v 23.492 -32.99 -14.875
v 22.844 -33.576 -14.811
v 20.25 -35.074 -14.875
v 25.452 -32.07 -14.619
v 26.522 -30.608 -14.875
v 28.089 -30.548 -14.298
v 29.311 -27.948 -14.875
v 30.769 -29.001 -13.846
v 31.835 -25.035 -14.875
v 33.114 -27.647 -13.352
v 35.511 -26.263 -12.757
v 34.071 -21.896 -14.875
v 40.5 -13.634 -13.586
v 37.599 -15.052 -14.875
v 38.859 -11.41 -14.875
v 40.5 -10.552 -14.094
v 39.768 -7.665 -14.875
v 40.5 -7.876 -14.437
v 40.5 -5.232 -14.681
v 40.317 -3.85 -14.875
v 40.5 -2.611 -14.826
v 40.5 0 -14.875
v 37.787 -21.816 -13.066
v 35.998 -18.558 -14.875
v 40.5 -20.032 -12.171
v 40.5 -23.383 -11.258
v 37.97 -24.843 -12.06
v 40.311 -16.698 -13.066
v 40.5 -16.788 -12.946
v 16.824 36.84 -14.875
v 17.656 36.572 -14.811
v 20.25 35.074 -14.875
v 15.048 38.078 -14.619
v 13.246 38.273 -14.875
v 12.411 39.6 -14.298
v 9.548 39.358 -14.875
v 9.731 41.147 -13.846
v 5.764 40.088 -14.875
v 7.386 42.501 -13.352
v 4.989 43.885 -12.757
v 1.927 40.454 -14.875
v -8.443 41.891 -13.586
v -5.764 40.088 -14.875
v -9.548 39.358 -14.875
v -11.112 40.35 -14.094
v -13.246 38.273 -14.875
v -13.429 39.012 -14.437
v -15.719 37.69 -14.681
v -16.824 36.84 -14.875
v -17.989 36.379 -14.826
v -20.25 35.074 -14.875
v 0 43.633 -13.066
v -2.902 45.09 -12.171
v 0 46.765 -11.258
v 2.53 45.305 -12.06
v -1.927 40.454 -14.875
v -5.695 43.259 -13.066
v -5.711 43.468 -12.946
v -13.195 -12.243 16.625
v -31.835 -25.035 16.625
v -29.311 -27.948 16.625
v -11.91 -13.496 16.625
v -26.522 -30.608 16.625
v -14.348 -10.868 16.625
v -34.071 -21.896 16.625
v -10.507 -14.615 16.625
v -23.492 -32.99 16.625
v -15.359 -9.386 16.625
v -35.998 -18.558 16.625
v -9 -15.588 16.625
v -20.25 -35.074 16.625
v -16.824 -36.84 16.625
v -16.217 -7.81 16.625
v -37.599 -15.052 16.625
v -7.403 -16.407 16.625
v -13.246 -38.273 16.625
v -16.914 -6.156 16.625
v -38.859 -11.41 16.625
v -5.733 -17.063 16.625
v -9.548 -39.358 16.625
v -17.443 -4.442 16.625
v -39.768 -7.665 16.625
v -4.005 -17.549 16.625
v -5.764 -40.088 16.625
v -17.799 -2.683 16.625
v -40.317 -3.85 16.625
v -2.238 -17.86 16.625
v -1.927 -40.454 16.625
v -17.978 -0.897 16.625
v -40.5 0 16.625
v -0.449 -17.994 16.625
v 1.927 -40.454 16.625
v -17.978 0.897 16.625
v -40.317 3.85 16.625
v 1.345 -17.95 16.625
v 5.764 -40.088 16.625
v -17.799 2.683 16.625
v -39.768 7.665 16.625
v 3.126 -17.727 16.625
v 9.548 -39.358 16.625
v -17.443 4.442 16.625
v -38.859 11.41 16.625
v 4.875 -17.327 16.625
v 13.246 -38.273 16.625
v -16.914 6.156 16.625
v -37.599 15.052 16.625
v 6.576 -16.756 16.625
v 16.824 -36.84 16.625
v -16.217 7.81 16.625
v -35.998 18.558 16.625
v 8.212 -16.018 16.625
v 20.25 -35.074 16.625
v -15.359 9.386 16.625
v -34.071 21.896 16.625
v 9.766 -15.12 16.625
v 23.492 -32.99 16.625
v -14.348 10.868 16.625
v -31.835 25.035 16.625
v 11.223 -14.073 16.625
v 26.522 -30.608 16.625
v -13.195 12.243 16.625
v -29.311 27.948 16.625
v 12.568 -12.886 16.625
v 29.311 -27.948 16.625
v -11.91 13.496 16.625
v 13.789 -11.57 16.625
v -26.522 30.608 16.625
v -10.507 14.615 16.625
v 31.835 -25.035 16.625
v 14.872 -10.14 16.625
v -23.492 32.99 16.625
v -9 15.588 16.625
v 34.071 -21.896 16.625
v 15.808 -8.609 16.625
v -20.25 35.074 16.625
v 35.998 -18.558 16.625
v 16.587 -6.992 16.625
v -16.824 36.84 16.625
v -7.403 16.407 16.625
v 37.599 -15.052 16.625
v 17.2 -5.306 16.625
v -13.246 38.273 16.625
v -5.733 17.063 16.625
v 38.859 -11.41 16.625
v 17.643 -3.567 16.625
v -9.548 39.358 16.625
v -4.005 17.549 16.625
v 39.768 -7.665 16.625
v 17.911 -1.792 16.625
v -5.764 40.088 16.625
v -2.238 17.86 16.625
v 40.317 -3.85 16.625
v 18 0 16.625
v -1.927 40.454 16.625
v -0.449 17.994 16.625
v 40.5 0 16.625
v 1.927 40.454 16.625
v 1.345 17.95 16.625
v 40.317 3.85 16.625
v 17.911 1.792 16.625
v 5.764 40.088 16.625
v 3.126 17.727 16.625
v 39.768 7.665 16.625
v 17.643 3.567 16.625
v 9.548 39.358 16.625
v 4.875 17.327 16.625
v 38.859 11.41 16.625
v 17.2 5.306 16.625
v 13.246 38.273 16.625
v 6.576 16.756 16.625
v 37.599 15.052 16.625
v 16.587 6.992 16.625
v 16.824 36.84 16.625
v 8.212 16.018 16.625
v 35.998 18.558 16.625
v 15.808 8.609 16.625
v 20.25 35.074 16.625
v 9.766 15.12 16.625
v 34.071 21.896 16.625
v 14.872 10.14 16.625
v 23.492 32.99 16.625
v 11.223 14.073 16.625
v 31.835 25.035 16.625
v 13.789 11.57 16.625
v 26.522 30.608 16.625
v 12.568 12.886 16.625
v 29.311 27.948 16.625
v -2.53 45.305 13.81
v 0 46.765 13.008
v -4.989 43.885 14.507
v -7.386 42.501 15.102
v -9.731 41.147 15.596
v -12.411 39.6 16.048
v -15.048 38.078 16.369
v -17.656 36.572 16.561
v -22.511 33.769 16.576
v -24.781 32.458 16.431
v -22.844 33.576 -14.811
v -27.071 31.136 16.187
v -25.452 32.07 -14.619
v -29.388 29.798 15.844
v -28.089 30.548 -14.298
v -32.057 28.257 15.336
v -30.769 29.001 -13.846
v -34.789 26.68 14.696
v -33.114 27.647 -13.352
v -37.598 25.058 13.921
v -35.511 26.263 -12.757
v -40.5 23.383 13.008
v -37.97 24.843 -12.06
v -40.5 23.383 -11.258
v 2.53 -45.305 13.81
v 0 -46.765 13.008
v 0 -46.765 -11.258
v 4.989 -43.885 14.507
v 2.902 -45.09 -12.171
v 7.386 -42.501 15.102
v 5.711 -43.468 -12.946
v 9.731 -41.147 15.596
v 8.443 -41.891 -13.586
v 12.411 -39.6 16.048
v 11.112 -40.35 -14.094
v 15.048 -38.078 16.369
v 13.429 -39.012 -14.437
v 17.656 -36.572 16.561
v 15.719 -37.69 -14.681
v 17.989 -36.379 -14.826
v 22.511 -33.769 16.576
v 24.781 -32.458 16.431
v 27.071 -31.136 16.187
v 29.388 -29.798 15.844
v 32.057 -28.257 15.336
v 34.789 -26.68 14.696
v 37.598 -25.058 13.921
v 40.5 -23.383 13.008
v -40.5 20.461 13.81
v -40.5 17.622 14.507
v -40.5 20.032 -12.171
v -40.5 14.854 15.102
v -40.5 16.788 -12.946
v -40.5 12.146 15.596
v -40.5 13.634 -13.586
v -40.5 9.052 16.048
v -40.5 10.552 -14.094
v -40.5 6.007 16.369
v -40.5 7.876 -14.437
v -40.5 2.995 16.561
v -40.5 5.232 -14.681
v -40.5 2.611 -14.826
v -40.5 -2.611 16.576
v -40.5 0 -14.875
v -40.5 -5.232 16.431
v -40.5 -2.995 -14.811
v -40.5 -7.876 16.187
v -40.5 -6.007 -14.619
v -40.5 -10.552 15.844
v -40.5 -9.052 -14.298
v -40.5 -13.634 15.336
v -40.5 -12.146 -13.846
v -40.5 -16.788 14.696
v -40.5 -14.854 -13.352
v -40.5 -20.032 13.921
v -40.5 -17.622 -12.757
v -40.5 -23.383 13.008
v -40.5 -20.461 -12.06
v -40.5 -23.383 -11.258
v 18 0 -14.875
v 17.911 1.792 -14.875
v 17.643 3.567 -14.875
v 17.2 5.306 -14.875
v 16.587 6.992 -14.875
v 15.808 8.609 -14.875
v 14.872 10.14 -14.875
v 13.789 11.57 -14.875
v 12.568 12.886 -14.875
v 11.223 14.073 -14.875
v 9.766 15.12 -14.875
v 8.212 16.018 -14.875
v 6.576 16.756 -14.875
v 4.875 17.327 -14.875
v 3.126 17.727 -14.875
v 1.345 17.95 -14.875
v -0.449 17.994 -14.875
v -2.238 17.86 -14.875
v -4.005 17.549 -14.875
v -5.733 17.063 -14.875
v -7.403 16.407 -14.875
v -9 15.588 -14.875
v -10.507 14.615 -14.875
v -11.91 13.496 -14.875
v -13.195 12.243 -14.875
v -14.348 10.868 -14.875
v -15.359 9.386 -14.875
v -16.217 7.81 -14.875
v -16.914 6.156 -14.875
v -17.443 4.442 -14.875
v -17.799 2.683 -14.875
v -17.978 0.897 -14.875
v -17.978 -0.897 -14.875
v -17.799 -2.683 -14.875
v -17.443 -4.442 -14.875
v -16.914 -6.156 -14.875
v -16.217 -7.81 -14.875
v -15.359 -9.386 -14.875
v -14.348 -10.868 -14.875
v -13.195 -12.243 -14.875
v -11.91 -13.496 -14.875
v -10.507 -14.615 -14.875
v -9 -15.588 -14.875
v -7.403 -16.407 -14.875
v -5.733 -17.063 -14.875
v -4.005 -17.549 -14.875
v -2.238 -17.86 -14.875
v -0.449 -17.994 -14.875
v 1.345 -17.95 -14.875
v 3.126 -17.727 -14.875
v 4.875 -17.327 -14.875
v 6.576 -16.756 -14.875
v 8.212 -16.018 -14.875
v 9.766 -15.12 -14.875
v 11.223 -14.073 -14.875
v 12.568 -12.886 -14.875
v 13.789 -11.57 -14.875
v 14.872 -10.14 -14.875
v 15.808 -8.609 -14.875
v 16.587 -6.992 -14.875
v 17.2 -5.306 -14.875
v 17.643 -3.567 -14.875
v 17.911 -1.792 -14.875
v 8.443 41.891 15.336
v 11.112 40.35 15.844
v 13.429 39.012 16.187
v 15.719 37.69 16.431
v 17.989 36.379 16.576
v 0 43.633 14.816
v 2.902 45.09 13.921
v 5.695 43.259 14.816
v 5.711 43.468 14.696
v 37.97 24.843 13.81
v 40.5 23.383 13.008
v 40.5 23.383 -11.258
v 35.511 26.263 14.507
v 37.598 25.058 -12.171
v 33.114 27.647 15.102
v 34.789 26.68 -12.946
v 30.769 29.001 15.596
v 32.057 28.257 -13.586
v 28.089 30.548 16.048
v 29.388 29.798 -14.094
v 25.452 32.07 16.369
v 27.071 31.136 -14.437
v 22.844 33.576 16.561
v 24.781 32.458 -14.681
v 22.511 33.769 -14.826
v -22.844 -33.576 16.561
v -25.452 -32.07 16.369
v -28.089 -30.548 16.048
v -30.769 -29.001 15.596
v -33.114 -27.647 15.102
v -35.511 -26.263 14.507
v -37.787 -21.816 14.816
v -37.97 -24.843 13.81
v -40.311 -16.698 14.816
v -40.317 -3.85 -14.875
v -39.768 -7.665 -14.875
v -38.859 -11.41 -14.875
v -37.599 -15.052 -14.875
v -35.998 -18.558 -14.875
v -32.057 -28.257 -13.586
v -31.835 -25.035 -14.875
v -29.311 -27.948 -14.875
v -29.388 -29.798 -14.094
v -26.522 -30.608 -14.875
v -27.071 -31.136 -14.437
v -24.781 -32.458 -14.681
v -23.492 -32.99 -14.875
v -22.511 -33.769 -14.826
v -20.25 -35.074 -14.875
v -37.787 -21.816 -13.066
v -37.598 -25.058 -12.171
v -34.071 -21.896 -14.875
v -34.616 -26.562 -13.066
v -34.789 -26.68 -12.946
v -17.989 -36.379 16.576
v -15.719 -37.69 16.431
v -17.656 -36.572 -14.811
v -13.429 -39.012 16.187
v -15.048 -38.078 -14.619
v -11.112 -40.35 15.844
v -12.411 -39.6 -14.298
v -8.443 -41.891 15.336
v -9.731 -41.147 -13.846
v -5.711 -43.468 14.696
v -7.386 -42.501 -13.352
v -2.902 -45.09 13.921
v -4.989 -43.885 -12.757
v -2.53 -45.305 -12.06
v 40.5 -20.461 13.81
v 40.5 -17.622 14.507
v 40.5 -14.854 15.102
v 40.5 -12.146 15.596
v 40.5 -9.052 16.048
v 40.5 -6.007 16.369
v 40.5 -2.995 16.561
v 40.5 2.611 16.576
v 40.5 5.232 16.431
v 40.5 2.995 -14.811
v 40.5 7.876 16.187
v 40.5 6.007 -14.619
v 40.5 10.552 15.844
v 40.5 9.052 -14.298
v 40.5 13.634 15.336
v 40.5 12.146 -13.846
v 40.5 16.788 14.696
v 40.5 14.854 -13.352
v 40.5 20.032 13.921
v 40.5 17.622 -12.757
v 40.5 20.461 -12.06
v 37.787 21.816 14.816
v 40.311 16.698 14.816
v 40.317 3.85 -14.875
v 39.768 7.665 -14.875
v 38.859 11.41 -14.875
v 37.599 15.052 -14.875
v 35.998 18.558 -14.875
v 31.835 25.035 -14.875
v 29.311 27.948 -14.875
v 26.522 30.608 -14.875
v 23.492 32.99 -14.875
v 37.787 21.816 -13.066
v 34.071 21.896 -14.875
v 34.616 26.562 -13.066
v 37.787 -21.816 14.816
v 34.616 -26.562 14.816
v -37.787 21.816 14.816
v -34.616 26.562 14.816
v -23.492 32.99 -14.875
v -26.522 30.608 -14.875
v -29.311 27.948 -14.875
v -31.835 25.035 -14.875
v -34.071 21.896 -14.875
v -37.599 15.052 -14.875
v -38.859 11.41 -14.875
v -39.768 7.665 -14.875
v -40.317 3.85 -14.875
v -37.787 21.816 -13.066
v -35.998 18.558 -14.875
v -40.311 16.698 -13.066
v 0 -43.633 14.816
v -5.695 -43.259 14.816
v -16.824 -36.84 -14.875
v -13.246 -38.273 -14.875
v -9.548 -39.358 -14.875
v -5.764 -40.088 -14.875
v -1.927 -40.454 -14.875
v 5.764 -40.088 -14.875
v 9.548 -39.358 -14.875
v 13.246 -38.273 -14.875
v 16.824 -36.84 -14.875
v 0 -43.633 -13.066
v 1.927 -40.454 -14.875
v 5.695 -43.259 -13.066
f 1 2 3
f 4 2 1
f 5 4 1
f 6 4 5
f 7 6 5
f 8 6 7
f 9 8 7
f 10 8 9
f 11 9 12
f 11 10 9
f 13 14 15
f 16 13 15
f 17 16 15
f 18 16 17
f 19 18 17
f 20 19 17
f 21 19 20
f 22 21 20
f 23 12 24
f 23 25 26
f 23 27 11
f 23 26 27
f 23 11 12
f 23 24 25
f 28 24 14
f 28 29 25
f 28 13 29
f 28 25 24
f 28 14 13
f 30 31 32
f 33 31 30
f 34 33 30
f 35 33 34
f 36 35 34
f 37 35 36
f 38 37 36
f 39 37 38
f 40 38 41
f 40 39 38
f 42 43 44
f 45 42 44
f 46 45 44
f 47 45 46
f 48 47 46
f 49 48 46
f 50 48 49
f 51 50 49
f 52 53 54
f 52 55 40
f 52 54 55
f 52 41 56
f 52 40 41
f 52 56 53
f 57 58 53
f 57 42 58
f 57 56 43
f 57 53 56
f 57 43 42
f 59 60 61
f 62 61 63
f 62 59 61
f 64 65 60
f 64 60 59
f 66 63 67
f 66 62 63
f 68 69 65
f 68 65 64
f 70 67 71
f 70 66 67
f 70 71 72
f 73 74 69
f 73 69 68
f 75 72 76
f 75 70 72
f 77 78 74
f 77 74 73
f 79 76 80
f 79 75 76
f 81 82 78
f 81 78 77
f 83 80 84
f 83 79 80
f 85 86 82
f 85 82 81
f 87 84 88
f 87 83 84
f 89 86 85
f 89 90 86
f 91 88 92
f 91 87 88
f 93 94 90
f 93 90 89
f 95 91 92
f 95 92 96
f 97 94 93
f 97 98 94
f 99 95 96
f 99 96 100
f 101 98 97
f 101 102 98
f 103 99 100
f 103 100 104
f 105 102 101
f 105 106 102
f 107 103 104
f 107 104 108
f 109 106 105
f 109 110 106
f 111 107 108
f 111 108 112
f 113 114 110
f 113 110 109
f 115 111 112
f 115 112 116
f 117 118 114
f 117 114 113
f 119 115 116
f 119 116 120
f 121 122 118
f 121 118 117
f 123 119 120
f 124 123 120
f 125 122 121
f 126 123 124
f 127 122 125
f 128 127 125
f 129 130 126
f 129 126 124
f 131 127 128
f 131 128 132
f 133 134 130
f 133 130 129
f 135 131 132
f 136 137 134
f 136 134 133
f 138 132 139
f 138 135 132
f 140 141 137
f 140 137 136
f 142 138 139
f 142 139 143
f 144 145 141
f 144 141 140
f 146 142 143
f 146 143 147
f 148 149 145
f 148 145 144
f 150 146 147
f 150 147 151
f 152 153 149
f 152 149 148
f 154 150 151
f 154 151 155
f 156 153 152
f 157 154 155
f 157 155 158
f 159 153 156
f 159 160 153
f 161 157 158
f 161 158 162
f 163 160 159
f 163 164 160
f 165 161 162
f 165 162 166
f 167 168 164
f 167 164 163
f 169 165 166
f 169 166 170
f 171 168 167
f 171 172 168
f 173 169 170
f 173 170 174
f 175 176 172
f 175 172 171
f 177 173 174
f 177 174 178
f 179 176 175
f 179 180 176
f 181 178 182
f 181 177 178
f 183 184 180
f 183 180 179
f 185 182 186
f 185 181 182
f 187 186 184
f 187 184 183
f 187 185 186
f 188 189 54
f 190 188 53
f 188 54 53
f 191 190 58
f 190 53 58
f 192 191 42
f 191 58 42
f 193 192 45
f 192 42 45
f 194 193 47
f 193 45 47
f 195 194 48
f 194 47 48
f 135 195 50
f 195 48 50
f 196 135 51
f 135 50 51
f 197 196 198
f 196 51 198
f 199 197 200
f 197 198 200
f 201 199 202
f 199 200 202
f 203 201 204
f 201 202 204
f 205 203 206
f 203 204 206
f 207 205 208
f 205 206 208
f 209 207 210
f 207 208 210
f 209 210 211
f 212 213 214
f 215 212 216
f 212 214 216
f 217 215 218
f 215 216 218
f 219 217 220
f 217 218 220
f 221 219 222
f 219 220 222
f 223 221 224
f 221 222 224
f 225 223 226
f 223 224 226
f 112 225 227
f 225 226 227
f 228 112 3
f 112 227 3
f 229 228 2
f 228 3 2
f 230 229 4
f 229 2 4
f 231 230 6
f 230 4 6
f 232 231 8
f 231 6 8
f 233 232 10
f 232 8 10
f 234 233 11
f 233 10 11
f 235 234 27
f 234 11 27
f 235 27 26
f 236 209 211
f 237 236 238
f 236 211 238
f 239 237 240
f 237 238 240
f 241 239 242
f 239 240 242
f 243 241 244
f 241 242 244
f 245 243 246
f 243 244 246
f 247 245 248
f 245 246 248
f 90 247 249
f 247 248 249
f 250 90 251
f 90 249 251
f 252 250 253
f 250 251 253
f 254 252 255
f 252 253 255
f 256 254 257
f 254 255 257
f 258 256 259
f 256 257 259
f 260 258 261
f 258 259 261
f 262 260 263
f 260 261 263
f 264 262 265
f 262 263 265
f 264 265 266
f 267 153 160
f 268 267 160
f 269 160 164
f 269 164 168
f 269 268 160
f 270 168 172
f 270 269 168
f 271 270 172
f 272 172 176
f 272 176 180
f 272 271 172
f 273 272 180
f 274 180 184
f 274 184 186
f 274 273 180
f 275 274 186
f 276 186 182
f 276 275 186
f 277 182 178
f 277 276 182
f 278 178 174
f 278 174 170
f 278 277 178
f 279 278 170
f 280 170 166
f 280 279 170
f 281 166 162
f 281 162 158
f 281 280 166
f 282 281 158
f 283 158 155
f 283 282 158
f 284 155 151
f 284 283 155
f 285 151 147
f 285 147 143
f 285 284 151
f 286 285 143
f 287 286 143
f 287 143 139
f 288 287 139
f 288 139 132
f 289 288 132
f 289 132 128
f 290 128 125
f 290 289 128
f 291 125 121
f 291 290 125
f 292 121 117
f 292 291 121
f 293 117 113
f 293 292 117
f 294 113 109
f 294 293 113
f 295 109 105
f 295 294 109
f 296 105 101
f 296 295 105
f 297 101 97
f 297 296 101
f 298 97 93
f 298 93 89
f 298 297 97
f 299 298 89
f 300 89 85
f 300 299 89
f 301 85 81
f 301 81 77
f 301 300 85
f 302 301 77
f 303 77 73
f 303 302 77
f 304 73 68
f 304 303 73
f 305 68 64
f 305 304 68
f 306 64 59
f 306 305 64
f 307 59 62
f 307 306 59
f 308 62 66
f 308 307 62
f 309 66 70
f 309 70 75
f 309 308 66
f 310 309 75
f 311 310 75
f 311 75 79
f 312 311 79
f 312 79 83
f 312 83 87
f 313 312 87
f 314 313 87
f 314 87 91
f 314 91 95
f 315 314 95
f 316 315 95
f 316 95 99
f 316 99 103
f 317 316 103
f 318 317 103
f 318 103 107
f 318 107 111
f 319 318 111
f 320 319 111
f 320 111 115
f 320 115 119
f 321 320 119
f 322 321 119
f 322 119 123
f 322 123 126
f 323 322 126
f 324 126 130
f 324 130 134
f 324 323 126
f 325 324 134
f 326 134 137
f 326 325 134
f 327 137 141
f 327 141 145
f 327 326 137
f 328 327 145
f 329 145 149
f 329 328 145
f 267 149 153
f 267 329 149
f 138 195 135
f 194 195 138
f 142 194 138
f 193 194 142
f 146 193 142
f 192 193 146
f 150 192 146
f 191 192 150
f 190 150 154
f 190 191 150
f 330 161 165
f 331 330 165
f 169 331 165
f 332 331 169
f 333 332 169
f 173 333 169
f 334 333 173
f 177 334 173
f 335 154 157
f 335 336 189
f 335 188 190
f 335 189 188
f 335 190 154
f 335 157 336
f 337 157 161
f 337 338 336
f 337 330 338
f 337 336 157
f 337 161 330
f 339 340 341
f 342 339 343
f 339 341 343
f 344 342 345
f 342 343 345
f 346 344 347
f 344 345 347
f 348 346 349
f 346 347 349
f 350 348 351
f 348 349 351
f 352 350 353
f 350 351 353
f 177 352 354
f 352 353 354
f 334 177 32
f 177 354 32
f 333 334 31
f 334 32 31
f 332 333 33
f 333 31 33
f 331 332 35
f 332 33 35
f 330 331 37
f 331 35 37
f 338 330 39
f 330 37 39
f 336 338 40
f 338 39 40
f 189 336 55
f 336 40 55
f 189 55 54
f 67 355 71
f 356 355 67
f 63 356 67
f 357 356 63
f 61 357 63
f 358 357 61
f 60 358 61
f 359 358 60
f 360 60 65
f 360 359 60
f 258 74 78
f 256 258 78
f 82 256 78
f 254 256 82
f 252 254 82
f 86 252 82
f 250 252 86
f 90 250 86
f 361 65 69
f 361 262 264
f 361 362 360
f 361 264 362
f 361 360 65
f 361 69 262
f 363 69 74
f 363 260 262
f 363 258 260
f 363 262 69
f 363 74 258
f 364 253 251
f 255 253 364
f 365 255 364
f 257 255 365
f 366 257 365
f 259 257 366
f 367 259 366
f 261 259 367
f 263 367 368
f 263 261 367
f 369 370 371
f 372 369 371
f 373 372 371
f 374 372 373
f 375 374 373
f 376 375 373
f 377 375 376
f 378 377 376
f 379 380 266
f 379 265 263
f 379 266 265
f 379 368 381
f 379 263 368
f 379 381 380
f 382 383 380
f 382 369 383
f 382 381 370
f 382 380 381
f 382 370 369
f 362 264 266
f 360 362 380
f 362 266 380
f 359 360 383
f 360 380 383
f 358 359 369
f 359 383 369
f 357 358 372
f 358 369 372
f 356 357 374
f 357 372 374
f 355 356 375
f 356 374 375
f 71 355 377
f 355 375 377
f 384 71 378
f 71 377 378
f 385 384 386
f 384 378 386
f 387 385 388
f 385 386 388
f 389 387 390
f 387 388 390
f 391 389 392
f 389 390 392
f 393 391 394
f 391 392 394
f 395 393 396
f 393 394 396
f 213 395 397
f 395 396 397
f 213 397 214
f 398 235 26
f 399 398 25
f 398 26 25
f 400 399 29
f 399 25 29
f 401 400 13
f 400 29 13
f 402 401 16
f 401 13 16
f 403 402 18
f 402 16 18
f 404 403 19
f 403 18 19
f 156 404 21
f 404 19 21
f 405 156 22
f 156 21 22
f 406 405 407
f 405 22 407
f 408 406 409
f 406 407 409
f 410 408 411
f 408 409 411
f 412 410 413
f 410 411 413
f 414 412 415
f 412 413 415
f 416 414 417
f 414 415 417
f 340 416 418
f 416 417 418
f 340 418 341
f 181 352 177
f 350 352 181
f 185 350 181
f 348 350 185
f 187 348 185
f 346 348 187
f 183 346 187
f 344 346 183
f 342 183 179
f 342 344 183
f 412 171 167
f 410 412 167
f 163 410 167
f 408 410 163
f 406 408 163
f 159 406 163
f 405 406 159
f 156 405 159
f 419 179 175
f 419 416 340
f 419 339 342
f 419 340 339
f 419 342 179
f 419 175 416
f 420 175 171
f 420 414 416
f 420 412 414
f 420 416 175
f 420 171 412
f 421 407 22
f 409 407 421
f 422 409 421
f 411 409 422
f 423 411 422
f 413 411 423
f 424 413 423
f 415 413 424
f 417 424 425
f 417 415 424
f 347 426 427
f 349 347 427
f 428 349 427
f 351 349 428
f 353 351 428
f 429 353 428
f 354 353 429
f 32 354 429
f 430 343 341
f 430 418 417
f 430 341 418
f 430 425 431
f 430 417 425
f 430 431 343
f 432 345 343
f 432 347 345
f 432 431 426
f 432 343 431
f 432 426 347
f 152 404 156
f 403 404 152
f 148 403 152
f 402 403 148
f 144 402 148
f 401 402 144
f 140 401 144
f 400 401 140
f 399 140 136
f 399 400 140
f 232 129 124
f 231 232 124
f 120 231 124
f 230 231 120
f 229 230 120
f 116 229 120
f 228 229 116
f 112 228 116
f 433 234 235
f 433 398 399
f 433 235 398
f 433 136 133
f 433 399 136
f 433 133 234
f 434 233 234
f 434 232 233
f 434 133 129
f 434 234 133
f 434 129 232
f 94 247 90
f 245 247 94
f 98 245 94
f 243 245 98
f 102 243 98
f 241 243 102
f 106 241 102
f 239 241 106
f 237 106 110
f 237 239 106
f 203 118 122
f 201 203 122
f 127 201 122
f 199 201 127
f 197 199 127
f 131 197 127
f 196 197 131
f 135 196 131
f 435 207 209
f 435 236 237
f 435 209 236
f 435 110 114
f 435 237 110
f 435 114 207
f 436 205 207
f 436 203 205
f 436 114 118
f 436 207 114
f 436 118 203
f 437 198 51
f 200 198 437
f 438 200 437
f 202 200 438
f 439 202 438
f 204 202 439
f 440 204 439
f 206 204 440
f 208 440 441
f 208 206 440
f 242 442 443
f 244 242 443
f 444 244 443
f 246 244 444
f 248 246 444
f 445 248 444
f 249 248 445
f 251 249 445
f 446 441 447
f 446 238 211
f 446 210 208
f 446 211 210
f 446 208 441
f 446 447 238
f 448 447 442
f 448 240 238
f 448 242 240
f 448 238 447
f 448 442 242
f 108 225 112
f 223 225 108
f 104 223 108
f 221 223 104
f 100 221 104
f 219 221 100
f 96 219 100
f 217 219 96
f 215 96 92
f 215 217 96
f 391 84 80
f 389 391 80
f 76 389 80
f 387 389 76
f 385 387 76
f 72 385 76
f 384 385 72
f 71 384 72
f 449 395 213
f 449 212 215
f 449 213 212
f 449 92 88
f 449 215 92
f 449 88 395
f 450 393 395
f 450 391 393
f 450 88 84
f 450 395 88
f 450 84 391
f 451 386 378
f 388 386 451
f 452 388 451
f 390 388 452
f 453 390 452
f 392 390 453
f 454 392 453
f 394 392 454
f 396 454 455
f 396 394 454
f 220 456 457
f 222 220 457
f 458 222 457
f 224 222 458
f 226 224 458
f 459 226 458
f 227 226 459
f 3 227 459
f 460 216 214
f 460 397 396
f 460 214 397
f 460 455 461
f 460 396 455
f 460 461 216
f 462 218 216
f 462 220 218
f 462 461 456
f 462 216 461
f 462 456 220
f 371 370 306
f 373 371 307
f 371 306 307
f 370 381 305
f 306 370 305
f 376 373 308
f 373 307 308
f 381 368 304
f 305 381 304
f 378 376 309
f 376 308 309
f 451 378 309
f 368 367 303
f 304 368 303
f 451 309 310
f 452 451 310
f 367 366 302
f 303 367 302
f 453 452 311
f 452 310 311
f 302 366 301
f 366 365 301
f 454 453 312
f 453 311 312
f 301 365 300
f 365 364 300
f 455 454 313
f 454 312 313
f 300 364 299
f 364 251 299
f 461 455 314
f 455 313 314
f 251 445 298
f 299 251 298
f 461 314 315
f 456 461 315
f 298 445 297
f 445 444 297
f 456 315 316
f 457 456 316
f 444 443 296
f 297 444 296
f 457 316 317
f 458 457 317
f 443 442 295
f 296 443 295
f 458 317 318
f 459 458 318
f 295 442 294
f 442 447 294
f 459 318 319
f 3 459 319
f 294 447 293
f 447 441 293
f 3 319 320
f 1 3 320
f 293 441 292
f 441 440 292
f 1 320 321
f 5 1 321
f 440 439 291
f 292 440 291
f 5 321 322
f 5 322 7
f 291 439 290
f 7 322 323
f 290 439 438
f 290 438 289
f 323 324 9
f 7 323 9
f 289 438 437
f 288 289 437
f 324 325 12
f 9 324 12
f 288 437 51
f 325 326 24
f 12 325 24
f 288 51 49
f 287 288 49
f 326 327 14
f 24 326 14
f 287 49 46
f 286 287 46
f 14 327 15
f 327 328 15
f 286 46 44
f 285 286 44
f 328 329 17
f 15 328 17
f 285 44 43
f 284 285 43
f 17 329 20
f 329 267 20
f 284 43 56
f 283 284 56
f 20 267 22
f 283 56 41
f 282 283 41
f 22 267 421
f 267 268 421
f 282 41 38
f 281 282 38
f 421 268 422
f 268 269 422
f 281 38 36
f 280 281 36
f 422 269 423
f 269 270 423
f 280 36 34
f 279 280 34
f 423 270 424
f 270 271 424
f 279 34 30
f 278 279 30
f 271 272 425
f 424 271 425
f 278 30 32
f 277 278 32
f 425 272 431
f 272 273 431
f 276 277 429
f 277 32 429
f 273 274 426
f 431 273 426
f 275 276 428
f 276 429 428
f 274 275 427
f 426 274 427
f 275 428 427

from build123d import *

# Parameters (mm, degrees)
SKETCH1_R           = 1
BOSS_EXTRUDE1_DEPTH = 1.75
SKETCH2_R           = 3.798357005
SKETCH2_R_2         = 2.25
CUT_EXTRUDE1_DEPTH  = 2
CUT_EXTRUDE1_TAPER  = 60
SKETCH3_R           = 3.513551011
SKETCH3_R_2         = 2.25
CUT_EXTRUDE2_DEPTH  = 2
CUT_EXTRUDE2_TAPER  = 60
SCALE1_SCALE        = 18


with BuildPart() as part:
    # Sketch1 → Boss-Extrude1 (new body)
    with BuildSketch(Plane.XY):
        Polygon((2.25, 1.299038106), (0, 2.598076211), (-2.25, 1.299038106), (-2.25, -1.299038106), (0, -2.598076211), (2.25, -1.299038106), align=None)
        Circle(SKETCH1_R, mode=Mode.SUBTRACT)
    extrude(amount=BOSS_EXTRUDE1_DEPTH)

    # Sketch2 → Cut-Extrude1 (cut)
    with BuildSketch(Plane.XY.offset(1.75)):
        Circle(SKETCH2_R)
        Circle(SKETCH2_R_2, mode=Mode.SUBTRACT)
    extrude(amount=-CUT_EXTRUDE1_DEPTH, taper=CUT_EXTRUDE1_TAPER, mode=Mode.SUBTRACT)

    # Sketch3 → Cut-Extrude2 (cut)
    with BuildSketch(Plane(origin=(0, 0, 0), x_dir=(-1, 0, 0), z_dir=(0, 0, -1))):
        Circle(SKETCH3_R)
        Circle(SKETCH3_R_2, mode=Mode.SUBTRACT)
    extrude(amount=-CUT_EXTRUDE2_DEPTH, taper=CUT_EXTRUDE2_TAPER, mode=Mode.SUBTRACT)


with BuildPart() as part_1:
    # Scale1: scaled about (0, 0, 0.875)
    add(part.part.scale(SCALE1_SCALE).moved(Location((0, 0, -14.875))))


solid = part_1.part
